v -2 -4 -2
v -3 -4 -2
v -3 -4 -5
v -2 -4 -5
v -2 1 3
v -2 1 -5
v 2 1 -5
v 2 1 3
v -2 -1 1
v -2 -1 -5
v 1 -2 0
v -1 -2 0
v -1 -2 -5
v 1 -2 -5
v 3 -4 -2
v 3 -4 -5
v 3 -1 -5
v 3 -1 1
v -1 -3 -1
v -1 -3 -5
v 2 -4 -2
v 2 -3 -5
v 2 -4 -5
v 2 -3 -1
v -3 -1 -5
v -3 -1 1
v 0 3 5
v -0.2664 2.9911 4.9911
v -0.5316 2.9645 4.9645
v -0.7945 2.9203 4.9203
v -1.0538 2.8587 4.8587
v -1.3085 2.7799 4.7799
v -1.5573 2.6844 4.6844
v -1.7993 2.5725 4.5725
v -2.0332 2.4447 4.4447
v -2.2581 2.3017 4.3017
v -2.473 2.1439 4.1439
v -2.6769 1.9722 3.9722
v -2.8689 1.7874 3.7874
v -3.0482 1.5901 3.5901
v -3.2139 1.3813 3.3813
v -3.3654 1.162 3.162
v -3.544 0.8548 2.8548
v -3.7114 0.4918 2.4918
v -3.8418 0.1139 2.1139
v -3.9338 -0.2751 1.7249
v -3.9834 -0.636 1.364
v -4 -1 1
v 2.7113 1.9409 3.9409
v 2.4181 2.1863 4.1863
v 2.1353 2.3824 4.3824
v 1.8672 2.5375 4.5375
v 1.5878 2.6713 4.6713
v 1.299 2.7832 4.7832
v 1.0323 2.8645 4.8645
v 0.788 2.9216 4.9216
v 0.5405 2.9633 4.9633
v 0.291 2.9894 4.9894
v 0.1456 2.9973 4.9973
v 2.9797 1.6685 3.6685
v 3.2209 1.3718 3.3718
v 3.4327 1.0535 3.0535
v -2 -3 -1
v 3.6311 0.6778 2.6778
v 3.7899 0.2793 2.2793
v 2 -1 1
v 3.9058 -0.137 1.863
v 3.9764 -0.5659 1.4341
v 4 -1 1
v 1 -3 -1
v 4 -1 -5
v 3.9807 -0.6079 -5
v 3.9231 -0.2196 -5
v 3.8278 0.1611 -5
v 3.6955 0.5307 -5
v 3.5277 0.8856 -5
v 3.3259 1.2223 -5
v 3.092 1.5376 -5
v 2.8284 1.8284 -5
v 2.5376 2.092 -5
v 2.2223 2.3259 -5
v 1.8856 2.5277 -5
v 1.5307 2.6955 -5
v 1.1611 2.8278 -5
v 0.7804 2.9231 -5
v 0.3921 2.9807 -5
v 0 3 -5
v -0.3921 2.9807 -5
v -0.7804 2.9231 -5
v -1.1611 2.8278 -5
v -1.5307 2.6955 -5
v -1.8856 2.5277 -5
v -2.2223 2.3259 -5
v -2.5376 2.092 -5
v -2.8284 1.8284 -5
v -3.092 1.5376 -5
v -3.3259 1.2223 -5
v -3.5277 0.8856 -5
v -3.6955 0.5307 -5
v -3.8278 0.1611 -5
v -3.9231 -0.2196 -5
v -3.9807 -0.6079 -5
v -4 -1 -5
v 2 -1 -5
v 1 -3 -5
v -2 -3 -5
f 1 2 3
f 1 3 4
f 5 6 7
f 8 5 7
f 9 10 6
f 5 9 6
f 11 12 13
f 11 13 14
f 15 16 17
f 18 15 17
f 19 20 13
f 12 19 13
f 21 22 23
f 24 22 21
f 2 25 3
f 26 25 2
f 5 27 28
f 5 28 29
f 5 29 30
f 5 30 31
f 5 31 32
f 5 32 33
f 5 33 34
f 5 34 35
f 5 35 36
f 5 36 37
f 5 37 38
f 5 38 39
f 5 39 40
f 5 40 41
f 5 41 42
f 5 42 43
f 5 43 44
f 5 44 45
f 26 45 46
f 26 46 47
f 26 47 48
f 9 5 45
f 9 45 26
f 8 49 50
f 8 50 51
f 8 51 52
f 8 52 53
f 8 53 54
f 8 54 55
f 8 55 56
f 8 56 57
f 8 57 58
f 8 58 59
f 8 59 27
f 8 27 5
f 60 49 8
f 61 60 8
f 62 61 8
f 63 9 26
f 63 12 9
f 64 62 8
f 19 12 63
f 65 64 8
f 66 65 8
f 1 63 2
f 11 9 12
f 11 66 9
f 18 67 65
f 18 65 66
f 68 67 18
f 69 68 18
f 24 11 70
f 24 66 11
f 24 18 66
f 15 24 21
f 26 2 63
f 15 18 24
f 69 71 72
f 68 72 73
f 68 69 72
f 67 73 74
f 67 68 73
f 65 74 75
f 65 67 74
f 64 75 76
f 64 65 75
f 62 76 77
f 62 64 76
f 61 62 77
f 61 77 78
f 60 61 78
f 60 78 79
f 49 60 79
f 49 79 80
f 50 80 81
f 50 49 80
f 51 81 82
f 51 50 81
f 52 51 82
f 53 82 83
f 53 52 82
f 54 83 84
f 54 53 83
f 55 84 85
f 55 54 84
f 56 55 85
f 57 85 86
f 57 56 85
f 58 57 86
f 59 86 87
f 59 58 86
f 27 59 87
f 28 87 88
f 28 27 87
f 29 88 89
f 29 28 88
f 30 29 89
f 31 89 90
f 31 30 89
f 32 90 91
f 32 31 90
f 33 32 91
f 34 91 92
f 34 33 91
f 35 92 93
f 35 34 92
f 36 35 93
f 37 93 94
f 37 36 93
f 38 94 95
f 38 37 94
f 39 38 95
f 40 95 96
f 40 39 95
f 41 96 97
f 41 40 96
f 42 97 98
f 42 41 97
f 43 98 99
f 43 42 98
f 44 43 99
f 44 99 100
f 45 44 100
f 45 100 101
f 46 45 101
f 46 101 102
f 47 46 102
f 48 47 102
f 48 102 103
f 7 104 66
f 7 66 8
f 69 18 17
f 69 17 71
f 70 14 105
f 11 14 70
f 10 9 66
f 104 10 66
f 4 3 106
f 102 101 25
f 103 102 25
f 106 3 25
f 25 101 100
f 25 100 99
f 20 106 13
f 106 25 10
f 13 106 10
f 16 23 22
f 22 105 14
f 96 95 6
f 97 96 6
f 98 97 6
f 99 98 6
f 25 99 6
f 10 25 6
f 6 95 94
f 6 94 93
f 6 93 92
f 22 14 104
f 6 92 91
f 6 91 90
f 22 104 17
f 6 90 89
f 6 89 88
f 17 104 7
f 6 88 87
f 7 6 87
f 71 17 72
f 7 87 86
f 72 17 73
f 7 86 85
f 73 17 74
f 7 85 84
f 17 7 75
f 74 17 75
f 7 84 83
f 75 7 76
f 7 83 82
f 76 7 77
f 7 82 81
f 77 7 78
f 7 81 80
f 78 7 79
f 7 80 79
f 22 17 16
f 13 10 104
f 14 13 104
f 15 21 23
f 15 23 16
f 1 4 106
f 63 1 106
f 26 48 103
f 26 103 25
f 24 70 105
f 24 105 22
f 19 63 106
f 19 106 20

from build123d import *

# Parameters (mm, degrees)
SKETCH2_W           = 4
SKETCH2_H           = 2
BOSS_EXTRUDE1_DEPTH = 5
CUT_EXTRUDE1_DEPTH  = 4


with BuildPart() as part:
    # Sketch2 → Boss-Extrude1 (new body, symmetric)
    with BuildSketch(Plane.XY):
        with BuildLine():
            Line((-4, -1), (-3, -1))
            Line((-3, -1), (-3, -4))
            Line((-3, -4), (-2, -4))
            Line((-2, -4), (-2, -3))
            Line((-2, -3), (-1, -3))
            Line((-1, -3), (-1, -2))
            Line((-1, -2), (1, -2))
            Line((1, -2), (1, -3))
            Line((1, -3), (2, -3))
            Line((2, -3), (2, -4))
            Line((2, -4), (3, -4))
            Line((3, -4), (3, -1))
            Line((3, -1), (4, -1))
            ThreePointArc((4, -1), (0, 3), (-4, -1))
        make_face()
        Rectangle(SKETCH2_W, SKETCH2_H, mode=Mode.SUBTRACT)
    extrude(amount=BOSS_EXTRUDE1_DEPTH, both=True)

    # Sketch3 → Cut-Extrude1 (cut, symmetric)
    with BuildSketch(Plane(origin=(0, 0, 0), x_dir=(0, 0, -1), z_dir=(1, 0, 0))):
        Polygon((-5, 3), (2, -4), (-5, -4), align=None)
    extrude(amount=CUT_EXTRUDE1_DEPTH, both=True, mode=Mode.SUBTRACT)


solid = part.part
